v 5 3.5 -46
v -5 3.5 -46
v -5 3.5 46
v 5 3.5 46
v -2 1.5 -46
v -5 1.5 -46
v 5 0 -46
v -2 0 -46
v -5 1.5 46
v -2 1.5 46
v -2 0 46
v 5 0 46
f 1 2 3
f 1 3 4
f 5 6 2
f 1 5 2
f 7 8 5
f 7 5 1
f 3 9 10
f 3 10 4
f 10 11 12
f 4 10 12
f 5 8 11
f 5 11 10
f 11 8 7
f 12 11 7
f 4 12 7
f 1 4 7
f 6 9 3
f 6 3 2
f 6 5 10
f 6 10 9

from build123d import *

# Parameters (mm, degrees)
SKETCH_1_W          = 10
SKETCH_1_H          = 92
EXTRUDE_1_DEPTH     = 3.5
SKETCH_2_W          = 7
SKETCH_2_H          = 7
EXTRUDE_2_DEPTH     = 7
SKETCH_3_R          = 1.5
CUT_EXTRUDE_1_DEPTH = 7
SKETCH_4_R          = 2.15
CUT_EXTRUDE_2_DEPTH = 1
SKETCH_5_W          = 3
SKETCH_5_H          = 1.5
CUT_EXTRUDE_3_DEPTH = 92
SKETCH_6_W          = 30.020813891
SKETCH_6_H          = 96.833093315
CUT_EXTRUDE_4_DEPTH = 10


with BuildPart() as part:
    # 스케치1 → 보스-돌출1 (new body)
    with BuildSketch(Plane(origin=(0, 0, 0), x_dir=(1, 0, 0), z_dir=(0, 1, 0))):
        Rectangle(SKETCH_1_W, SKETCH_1_H)
    extrude(amount=EXTRUDE_1_DEPTH)

    # 스케치2 → 보스-돌출2 (add)
    with BuildSketch(Plane.XZ):
        with Locations((1.5, 40)):
            Rectangle(SKETCH_2_W, SKETCH_2_H)
        with Locations((1.5, 0)):
            Rectangle(SKETCH_2_W, SKETCH_2_H)
        with Locations((1.5, -40)):
            Rectangle(SKETCH_2_W, SKETCH_2_H)
    extrude(amount=EXTRUDE_2_DEPTH)

    # 스케치3 → 컷-돌출1 (cut)
    with BuildSketch(Plane(origin=(5, 0, 0), x_dir=(0, 0, -1), z_dir=(1, 0, 0))):
        with Locations((-40, -3.5)):
            Circle(SKETCH_3_R)
        with Locations((0, -3.5)):
            Circle(SKETCH_3_R)
        with Locations((40, -3.5)):
            Circle(SKETCH_3_R)
    extrude(amount=-CUT_EXTRUDE_1_DEPTH, mode=Mode.SUBTRACT)

    # 스케치4 → 컷-돌출2 (cut)
    with BuildSketch(Plane.ZY.offset(2)):
        with Locations((-40, -3.5)):
            Circle(SKETCH_4_R)
        with Locations((0, -3.5)):
            Circle(SKETCH_4_R)
        with Locations((40, -3.5)):
            Circle(SKETCH_4_R)
    extrude(amount=-CUT_EXTRUDE_2_DEPTH, mode=Mode.SUBTRACT)

    # 스케치5 → 컷-돌출3 (cut)
    with BuildSketch(Plane(origin=(0, 0, -46), x_dir=(-1, 0, 0), z_dir=(0, 0, -1))):
        with Locations((3.5, 0.75)):
            Rectangle(SKETCH_5_W, SKETCH_5_H)
    extrude(amount=-CUT_EXTRUDE_3_DEPTH, mode=Mode.SUBTRACT)

    # 스케치6 → 컷-돌출4 (cut)
    with BuildSketch(Plane.XZ):
        with Locations((-3.768545255, 0.383256933)):
            Rectangle(SKETCH_6_W, SKETCH_6_H)
    extrude(amount=CUT_EXTRUDE_4_DEPTH, mode=Mode.SUBTRACT)


solid = part.part
